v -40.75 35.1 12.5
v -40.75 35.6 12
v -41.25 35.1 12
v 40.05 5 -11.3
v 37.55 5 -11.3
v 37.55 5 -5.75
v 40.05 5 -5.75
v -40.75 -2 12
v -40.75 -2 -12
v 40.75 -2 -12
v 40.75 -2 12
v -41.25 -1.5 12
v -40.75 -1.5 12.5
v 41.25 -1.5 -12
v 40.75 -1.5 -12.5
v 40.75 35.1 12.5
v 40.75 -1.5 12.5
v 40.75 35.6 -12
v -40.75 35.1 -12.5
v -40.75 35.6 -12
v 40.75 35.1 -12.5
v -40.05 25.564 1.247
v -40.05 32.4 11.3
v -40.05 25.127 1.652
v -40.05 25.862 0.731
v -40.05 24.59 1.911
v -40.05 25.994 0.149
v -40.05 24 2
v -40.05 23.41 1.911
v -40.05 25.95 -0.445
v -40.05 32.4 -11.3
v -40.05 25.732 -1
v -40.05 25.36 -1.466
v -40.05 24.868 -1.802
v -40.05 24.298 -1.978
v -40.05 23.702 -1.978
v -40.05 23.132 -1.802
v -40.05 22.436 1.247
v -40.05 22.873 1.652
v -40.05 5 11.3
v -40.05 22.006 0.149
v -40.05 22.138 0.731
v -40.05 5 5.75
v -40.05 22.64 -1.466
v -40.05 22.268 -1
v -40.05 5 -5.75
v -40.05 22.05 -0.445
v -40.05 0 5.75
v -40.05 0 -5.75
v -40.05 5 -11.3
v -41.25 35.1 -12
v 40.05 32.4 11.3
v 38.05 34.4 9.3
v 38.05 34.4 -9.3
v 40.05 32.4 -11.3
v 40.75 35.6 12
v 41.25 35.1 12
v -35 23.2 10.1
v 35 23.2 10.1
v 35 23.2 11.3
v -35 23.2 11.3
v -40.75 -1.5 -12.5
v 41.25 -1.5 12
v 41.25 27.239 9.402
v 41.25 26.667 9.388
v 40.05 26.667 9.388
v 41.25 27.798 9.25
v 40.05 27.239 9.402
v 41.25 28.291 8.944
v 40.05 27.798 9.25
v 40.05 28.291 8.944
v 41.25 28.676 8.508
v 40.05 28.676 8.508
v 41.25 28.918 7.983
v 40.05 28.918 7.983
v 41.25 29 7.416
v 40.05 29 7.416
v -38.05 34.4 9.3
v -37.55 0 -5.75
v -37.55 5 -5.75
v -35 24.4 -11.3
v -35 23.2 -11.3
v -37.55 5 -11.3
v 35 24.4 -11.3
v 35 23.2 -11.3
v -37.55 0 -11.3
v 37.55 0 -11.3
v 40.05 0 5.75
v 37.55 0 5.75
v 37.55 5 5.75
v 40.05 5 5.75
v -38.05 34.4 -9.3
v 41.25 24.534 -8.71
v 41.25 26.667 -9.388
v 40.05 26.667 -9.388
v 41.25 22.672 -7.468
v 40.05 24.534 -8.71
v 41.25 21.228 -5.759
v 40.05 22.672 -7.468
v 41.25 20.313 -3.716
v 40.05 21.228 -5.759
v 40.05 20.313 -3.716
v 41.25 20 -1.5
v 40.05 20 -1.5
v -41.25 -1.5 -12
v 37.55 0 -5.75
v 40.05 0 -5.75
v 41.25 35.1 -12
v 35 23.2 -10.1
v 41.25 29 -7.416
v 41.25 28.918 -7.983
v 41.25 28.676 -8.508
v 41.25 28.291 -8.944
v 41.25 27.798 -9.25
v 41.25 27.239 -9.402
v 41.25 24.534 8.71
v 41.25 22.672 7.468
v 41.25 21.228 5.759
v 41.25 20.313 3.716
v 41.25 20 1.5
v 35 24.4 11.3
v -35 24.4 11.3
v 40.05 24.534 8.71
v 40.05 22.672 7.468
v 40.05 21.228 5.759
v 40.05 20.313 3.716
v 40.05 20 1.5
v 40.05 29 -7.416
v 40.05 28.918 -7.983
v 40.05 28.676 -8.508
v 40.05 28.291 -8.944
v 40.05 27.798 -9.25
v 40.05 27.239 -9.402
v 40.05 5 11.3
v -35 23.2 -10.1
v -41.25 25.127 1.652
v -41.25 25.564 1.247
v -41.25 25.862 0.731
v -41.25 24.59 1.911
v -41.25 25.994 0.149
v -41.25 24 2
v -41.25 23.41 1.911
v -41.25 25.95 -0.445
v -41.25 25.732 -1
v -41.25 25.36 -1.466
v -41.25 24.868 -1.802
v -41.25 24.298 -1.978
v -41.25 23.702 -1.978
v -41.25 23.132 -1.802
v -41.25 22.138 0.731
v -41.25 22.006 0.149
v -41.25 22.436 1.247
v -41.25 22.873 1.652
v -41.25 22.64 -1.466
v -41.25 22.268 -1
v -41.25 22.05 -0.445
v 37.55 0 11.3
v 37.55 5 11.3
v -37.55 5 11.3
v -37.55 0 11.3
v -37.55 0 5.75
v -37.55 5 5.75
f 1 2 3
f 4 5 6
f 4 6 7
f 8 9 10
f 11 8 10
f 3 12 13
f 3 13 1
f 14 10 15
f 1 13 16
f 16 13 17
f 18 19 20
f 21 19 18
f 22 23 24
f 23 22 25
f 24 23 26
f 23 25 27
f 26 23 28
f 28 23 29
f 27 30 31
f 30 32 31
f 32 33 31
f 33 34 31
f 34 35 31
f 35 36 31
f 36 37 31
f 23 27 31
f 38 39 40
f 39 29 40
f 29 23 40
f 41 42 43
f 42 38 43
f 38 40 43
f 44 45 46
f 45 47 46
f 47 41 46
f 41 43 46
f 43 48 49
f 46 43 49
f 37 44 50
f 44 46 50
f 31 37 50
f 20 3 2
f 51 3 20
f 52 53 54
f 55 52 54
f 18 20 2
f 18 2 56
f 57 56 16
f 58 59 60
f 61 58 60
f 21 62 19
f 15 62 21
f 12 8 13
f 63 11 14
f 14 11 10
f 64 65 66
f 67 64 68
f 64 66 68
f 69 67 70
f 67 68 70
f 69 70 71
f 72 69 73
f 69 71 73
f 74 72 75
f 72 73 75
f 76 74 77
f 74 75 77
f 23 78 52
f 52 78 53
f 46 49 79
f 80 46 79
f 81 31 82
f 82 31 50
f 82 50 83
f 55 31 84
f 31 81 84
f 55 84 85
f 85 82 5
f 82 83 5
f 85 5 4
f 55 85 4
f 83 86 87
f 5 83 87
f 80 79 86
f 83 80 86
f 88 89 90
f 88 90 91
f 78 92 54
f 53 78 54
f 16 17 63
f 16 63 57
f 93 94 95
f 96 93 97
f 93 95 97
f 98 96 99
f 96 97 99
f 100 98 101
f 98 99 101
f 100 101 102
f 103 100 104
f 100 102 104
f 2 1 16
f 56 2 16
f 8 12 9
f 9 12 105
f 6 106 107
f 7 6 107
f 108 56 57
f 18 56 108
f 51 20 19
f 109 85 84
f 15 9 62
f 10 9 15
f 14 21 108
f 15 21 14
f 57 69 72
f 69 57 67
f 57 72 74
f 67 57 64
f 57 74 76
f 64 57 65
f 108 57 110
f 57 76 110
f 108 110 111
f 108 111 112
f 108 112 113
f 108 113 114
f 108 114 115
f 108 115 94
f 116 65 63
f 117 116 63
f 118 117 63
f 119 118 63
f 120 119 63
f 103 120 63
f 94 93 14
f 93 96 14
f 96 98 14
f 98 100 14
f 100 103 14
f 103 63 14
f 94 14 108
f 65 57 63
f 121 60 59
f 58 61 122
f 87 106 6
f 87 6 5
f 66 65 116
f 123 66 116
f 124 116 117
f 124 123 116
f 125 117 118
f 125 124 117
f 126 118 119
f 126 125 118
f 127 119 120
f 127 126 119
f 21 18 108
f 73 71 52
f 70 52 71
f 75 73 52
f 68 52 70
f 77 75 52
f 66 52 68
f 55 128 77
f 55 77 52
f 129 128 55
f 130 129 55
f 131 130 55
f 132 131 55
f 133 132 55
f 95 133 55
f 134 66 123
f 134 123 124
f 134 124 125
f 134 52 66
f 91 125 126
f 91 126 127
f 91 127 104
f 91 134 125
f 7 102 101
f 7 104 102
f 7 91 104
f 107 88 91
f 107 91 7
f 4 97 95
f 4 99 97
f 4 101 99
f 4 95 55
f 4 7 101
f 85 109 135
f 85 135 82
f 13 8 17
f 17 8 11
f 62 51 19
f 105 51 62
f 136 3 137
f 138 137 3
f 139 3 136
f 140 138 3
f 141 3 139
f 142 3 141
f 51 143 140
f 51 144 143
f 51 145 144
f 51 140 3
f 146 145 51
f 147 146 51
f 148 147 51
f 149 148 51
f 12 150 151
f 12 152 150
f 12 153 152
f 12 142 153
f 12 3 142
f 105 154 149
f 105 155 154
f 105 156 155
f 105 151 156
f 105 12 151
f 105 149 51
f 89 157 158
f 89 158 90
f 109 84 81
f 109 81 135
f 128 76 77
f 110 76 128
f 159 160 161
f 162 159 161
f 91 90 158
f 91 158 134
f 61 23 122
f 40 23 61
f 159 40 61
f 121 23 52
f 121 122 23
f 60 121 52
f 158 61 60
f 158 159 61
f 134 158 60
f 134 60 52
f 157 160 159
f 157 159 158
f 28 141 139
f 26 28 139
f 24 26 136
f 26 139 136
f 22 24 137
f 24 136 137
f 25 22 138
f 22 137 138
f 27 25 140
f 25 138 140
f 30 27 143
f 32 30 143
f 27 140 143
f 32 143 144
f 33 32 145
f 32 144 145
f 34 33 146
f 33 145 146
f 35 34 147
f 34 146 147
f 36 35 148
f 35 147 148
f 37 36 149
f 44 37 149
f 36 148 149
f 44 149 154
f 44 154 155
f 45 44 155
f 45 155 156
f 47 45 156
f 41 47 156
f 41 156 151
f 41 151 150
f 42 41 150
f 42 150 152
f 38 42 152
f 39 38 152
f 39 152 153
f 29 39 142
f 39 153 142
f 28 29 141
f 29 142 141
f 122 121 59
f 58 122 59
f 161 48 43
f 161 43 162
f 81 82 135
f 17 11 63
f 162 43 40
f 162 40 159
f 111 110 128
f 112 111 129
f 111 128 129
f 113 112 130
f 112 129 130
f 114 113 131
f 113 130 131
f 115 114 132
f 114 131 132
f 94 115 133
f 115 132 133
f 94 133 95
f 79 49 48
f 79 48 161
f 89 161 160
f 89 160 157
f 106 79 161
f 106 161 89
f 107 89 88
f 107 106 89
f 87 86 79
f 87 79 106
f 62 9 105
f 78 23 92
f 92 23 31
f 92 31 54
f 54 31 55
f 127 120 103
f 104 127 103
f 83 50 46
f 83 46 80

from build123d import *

# Parameters (mm, degrees)
SKETCH1_W           = 82.5
SKETCH1_H           = 25
SKETCH1_W_2         = 80.1
SKETCH1_H_2         = 22.6
BOSS_EXTRUDE1_DEPTH = 23.2
SKETCH1_2_W         = 82.5
SKETCH1_2_H         = 25
BOSS_EXTRUDE2_DEPTH = 2
SKETCH2_W           = 2.5
SKETCH2_H           = 5.55
BOSS_EXTRUDE3_DEPTH = 5
SKETCH8_W           = 82.5
SKETCH8_H           = 25
SKETCH8_W_2         = 80.1
SKETCH8_H_2         = 22.6
BOSS_EXTRUDE4_DEPTH = 11.2
SKETCH10_W          = 82.5
SKETCH10_H          = 25
BOSS_EXTRUDE6_DEPTH = 1.2
SKETCH11_W          = 19
SKETCH11_H          = 9
CUT_EXTRUDE1_DEPTH  = 1.2
FILLET1_R           = 8
FILLET2_R           = 2
CHAMFER1_SIZE       = 0.5
CHAMFER2_SIZE       = 2
SKETCH12_R          = 2
CUT_EXTRUDE2_DEPTH  = 1.2


with BuildPart() as part:
    # Sketch1 → Boss-Extrude1 (new body)
    with BuildSketch(Plane(origin=(0, 0, 0), x_dir=(1, 0, 0), z_dir=(0, 1, 0))):
        Rectangle(SKETCH1_W, SKETCH1_H)
        Rectangle(SKETCH1_W_2, SKETCH1_H_2, mode=Mode.SUBTRACT)
    extrude(amount=BOSS_EXTRUDE1_DEPTH)

    # Sketch1<2> → Boss-Extrude2 (add)
    with BuildSketch(Plane(origin=(0, 0, 0), x_dir=(1, 0, 0), z_dir=(0, 1, 0))):
        Rectangle(SKETCH1_2_W, SKETCH1_2_H)
    extrude(amount=-BOSS_EXTRUDE2_DEPTH)

    # Sketch2 → Boss-Extrude3 (add)
    with BuildSketch(Plane(origin=(0, 0, 0), x_dir=(1, 0, 0), z_dir=(0, 1, 0))):
        with Locations((-38.8, 8.525)):
            Rectangle(SKETCH2_W, SKETCH2_H)
        with Locations((-38.8, -8.525)):
            Rectangle(SKETCH2_W, SKETCH2_H)
        with Locations((38.8, -8.525)):
            Rectangle(SKETCH2_W, SKETCH2_H)
        with Locations((38.8, 8.525)):
            Rectangle(SKETCH2_W, SKETCH2_H)
    extrude(amount=BOSS_EXTRUDE3_DEPTH)

    # Sweep2: sweep along a path in Sketch3
    with BuildLine(Plane(origin=(0, 23.2, 0), x_dir=(1, 0, 0), z_dir=(0, 1, 0))) as sweep2_path:
        Line((-35, 11.3), (35, 11.3))
    # Sketch4 → Sweep2 (sweep)
    with BuildSketch(Plane(origin=(0, 0, 0), x_dir=(0, 0, -1), z_dir=(1, 0, 0))):
        Polygon((10.1, 23.2), (11.3, 24.4), (12.5, 24.4), (12.5, 23.2), align=None)
    sweep2 = sweep(path=sweep2_path.line)

    # Mirror1: Sweep2 across plane
    add(sweep2.mirror(Plane.XY))

    # Sketch8 → Boss-Extrude4 (add)
    with BuildSketch(Plane(origin=(0, 23.2, 0), x_dir=(1, 0, 0), z_dir=(0, 1, 0))):
        Rectangle(SKETCH8_W, SKETCH8_H)
        Rectangle(SKETCH8_W_2, SKETCH8_H_2, mode=Mode.SUBTRACT)
    extrude(amount=BOSS_EXTRUDE4_DEPTH)

    # Sketch10 → Boss-Extrude6 (add)
    with BuildSketch(Plane(origin=(0, 34.4, 0), x_dir=(1, 0, 0), z_dir=(0, 1, 0))):
        Rectangle(SKETCH10_W, SKETCH10_H)
    extrude(amount=BOSS_EXTRUDE6_DEPTH)

    # Sketch11 → Cut-Extrude1 (cut)
    with BuildSketch(Plane(origin=(41.25, 0, 0), x_dir=(0, 0, -1), z_dir=(1, 0, 0))):
        with Locations((0, 24.5)):
            Rectangle(SKETCH11_W, SKETCH11_H)
    extrude(amount=-CUT_EXTRUDE1_DEPTH, mode=Mode.SUBTRACT)

    # Fillet1
    fillet1_edges = [part.edges().sort_by_distance(p)[0] for p in [
        (40.65, 20, -9.5),
        (40.65, 20, 9.5),
    ]]
    fillet(fillet1_edges, radius=FILLET1_R)

    # Fillet2
    fillet2_edges = [part.edges().sort_by_distance(p)[0] for p in [
        (40.65, 29, 9.5),
        (40.65, 29, -9.5),
    ]]
    fillet(fillet2_edges, radius=FILLET2_R)

    # Chamfer1
    chamfer1_edges = [part.edges().sort_by_distance(p)[0] for p in [
        (0, -2, -12.5),
        (41.25, 16.8, -12.5),
        (0, 35.6, -12.5),
        (-41.25, 16.8, -12.5),
        (-41.25, -2, 0),
        (0, -2, 12.5),
        (41.25, -2, 0),
        (41.25, 35.6, 0),
        (41.25, 16.8, 12.5),
        (0, 35.6, 12.5),
        (-41.25, 16.8, 12.5),
        (-41.25, 35.6, 0),
    ]]
    chamfer(chamfer1_edges, length=CHAMFER1_SIZE)

    # Chamfer2
    chamfer2_edges = [part.edges().sort_by_distance(p)[0] for p in [
        (0, 34.4, 11.3),
        (40.05, 34.4, 0),
        (0, 34.4, -11.3),
        (-40.05, 34.4, 0),
    ]]
    chamfer(chamfer2_edges, length=CHAMFER2_SIZE)

    # Sketch12 → Cut-Extrude2 (cut)
    with BuildSketch(Plane.ZY.offset(41.25)):
        with Locations((0, 24)):
            Circle(SKETCH12_R)
    extrude(amount=-CUT_EXTRUDE2_DEPTH, mode=Mode.SUBTRACT)


solid = part.part
